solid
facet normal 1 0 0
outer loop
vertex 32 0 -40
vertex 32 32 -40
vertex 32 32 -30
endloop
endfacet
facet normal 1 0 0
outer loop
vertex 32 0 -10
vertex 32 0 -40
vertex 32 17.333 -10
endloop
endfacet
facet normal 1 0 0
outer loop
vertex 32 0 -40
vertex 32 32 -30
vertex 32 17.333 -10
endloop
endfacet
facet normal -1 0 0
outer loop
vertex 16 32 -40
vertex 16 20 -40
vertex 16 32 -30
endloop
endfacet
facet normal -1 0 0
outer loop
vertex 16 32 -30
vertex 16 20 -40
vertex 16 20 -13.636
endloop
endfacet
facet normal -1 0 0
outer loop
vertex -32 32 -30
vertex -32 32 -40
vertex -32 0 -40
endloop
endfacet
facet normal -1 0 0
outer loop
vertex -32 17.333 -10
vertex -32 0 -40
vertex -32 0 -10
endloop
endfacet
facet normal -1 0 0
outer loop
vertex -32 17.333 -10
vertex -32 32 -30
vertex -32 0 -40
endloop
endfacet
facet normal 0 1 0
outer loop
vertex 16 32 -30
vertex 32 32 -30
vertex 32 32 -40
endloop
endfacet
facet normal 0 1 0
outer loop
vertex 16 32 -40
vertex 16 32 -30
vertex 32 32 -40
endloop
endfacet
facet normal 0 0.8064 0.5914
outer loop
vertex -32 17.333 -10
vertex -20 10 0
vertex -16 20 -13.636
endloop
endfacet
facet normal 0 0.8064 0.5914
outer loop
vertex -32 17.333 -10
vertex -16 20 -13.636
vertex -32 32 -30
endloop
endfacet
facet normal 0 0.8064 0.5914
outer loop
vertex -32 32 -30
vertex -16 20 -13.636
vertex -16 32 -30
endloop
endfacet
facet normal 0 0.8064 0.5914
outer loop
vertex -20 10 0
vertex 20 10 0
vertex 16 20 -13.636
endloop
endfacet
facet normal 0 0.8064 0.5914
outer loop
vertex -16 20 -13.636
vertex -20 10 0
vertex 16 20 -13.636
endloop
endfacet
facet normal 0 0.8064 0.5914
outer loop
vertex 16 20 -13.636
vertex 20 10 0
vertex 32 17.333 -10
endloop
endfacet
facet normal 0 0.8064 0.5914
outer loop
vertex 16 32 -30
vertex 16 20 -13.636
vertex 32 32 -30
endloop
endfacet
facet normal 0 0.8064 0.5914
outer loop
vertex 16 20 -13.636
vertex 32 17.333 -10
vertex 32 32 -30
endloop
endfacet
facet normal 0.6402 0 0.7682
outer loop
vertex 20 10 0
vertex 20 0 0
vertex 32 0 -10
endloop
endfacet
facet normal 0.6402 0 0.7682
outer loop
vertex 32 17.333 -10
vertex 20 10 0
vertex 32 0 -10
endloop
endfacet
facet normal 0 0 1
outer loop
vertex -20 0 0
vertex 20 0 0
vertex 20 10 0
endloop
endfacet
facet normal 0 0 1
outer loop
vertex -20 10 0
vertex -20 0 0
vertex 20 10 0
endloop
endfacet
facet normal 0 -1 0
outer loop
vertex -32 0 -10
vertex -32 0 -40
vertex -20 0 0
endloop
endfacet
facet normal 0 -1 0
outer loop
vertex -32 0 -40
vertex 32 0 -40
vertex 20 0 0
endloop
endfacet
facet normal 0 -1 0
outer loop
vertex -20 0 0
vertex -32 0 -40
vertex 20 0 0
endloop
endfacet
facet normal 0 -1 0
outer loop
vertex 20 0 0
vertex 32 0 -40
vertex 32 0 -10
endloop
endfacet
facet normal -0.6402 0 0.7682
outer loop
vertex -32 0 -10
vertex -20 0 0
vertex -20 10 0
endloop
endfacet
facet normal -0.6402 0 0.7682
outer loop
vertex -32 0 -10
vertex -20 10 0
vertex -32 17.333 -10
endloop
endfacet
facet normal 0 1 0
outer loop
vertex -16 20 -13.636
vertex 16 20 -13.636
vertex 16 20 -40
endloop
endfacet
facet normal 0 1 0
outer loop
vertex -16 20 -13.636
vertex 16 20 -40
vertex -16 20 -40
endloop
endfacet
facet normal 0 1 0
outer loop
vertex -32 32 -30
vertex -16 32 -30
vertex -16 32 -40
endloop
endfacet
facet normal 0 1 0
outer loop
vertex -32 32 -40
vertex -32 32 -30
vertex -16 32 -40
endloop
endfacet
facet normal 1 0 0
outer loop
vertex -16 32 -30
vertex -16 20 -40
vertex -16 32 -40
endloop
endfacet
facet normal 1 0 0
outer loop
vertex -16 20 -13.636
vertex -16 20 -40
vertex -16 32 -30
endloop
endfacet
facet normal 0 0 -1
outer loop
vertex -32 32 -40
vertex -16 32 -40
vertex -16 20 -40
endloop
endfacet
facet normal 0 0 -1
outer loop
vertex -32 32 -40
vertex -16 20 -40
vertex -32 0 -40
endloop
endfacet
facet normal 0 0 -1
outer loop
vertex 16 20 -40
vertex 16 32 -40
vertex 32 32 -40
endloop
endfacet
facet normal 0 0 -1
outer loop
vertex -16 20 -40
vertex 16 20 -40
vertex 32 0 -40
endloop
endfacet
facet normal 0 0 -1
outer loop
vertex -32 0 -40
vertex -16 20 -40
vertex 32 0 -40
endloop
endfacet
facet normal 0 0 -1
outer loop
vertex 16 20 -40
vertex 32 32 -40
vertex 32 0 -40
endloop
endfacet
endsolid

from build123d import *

# Parameters (mm, degrees)
EXTRUDE_1_DEPTH     = 32
SKETCH_2_W          = 32
SKETCH_2_H          = 12
CUT_EXTRUDE_2_DEPTH = 61.398675482
CUT_EXTRUDE_3_DEPTH = 61.398675482


with BuildPart() as part:
    # 草圖1 → 伸長1 (new, symmetric)
    with BuildSketch(Plane(origin=(0, 0, 0), x_dir=(0, 0, -1), z_dir=(1, 0, 0))):
        Polygon((0, 0), (0, 10), (30, 32), (40, 32), (40, 0), align=None)
    extrude(amount=EXTRUDE_1_DEPTH, both=True)

    # 草圖2 → 伸長2 (cut, through all)
    with BuildSketch(Plane(origin=(0, 0, 0), x_dir=(-1, 0, 0), z_dir=(0, 0, -1))):
        with Locations((0, 26)):
            Rectangle(SKETCH_2_W, SKETCH_2_H)
    extrude(amount=CUT_EXTRUDE_2_DEPTH, mode=Mode.SUBTRACT)

    # 草圖3 → 伸長3 (cut, through all)
    with BuildSketch(Plane.XZ):
        Polygon((-32, -10), (-32, 0), (-20, 0), align=None)
        Polygon((32, -10), (32, 0), (20, 0), align=None)
    extrude(amount=-CUT_EXTRUDE_3_DEPTH, mode=Mode.SUBTRACT)


solid = part.part
